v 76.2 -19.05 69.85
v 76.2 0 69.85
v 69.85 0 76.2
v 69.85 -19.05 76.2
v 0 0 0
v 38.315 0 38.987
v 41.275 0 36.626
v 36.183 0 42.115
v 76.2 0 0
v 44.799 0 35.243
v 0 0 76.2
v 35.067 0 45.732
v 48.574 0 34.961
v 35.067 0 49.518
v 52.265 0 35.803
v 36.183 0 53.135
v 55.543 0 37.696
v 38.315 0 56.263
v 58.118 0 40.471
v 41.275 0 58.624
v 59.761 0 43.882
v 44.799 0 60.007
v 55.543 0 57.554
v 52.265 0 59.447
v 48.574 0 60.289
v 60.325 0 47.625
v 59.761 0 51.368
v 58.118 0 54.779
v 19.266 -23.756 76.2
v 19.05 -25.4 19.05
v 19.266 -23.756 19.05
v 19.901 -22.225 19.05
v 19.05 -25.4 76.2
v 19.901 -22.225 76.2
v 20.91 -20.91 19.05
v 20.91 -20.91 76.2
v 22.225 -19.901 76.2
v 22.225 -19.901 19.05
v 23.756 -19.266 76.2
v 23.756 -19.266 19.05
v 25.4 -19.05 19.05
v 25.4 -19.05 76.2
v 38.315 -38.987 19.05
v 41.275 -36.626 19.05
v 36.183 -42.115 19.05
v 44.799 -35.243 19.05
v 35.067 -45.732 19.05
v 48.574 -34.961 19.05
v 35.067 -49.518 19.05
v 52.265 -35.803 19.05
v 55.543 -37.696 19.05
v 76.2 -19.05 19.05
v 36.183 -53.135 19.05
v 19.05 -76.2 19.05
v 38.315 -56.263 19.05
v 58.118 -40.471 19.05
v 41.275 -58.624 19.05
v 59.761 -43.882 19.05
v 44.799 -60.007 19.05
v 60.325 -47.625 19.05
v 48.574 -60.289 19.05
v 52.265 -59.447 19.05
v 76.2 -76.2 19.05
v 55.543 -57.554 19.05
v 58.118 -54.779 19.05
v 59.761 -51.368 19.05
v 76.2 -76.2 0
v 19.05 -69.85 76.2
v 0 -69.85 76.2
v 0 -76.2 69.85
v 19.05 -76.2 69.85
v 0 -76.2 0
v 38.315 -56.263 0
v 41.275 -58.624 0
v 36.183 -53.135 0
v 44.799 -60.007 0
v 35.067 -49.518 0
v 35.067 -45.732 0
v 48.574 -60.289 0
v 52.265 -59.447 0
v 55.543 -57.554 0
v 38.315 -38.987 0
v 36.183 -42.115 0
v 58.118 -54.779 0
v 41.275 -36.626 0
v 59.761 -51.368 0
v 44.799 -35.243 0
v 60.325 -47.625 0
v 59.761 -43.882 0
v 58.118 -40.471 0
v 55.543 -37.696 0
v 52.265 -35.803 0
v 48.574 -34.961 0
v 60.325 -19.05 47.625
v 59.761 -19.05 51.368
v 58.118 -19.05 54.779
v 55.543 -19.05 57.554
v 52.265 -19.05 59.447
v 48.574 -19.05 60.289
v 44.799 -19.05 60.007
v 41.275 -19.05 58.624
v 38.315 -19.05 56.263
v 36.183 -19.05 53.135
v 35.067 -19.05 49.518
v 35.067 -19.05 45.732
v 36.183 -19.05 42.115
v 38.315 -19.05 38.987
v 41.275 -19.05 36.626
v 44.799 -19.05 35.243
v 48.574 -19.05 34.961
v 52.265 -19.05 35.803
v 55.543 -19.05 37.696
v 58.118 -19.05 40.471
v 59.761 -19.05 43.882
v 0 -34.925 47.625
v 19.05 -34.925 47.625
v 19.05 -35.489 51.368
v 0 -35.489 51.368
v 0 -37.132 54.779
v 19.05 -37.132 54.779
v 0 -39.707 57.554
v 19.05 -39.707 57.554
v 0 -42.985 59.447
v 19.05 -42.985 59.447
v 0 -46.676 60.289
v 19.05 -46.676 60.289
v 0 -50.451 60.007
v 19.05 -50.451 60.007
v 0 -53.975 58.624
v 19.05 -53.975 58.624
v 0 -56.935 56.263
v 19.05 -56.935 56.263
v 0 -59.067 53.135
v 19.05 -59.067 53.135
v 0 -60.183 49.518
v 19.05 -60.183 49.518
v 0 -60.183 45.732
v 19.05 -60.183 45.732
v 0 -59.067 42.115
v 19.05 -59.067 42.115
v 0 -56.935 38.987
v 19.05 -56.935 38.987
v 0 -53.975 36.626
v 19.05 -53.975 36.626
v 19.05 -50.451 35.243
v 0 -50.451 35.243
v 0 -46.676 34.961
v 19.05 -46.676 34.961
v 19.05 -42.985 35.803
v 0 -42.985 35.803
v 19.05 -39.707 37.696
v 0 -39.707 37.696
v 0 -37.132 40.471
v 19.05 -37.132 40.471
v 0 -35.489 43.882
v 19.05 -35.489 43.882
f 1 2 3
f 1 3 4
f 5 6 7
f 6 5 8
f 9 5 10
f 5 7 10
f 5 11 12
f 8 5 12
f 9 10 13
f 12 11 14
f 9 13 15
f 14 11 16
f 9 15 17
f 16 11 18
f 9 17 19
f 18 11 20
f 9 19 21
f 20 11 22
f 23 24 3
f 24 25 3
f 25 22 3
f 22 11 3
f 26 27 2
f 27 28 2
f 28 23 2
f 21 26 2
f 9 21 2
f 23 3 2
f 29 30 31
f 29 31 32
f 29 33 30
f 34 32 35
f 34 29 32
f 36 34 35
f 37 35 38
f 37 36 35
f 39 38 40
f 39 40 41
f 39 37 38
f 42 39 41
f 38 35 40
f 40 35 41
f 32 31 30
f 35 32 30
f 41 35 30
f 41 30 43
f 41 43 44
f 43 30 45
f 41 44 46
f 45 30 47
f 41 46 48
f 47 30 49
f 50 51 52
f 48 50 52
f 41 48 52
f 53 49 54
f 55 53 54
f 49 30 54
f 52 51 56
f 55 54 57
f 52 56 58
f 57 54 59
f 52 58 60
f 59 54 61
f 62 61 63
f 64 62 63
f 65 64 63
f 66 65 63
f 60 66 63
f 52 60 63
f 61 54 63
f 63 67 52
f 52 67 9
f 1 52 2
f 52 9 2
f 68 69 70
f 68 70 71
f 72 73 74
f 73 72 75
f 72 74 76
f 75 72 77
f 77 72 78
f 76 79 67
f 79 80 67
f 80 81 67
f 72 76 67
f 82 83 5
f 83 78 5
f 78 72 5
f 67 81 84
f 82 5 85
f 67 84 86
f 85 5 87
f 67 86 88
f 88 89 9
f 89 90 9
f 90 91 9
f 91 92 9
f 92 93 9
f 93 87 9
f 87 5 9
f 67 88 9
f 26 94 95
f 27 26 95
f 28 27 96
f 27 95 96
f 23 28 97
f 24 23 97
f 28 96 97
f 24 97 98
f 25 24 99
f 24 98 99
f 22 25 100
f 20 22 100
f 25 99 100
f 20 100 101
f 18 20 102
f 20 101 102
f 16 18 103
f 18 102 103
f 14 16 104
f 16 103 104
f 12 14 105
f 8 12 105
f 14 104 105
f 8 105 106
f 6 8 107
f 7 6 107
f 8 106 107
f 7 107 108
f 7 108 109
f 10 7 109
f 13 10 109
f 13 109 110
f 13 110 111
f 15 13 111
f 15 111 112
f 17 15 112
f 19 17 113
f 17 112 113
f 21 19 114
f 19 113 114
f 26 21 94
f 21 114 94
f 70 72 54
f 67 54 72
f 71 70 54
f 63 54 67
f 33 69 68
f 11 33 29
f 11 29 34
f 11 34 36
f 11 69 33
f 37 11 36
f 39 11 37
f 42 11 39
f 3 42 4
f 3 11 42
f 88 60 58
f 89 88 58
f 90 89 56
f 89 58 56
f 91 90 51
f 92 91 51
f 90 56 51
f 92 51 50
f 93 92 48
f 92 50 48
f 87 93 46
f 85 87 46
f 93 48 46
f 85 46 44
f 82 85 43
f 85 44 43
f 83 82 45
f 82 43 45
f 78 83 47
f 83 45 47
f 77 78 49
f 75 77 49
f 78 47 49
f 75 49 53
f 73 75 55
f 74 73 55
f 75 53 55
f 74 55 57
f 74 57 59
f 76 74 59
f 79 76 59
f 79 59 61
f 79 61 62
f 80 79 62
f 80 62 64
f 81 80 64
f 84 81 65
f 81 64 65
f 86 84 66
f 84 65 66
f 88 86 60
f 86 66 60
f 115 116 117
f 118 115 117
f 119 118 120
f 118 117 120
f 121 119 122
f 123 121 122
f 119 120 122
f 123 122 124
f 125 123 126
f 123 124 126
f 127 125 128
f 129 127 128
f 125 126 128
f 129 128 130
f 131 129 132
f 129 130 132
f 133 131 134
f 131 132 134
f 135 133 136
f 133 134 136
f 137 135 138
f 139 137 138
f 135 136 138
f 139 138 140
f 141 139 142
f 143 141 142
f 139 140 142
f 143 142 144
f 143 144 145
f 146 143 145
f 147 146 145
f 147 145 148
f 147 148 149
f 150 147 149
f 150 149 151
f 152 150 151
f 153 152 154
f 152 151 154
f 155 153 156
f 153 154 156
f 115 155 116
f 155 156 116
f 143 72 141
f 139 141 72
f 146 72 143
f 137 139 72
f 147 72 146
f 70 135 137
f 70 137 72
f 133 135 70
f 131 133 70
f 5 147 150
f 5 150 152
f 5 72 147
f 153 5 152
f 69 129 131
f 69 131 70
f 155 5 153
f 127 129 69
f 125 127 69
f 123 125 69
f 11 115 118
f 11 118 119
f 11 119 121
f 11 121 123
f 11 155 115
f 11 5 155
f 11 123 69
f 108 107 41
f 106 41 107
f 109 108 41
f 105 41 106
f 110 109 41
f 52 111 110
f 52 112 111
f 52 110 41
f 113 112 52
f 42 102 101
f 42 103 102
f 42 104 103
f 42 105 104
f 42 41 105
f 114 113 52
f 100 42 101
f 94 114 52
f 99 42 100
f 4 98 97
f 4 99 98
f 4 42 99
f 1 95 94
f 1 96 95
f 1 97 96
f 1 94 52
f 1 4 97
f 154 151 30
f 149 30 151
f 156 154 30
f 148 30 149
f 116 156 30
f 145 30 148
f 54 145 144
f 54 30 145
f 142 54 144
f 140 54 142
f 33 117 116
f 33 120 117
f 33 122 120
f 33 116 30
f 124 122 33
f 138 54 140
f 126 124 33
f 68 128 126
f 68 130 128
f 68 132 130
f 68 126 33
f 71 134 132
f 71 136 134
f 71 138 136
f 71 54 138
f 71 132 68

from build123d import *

# Parameters (mm, degrees)
F0_W     = 76.2
F0_H     = 76.2
F1_DEPTH = 76.2
F2_W     = 57.15
F2_H     = 57.15
F3_DEPTH = 57.15
F4_R     = 12.7
F5_DEPTH = 19.05
F6_R     = 12.7
F7_DEPTH = 19.05
F8_R     = 12.7
F9_DEPTH = 19.05
F10_SIZE = 6.35
F11_R    = 6.35


with BuildPart() as f1:
    # F0 (on Front) → F1 (new body)
    with BuildSketch(Plane.XZ):
        with Locations((38.1, 38.1)):
            Rectangle(F0_W, F0_H)
    extrude(amount=F1_DEPTH)

    # F2 (on face) → F3 (cut)
    with BuildSketch(Plane.XZ.offset(76.2)):
        with Locations((47.625, 47.625)):
            Rectangle(F2_W, F2_H)
    extrude(amount=-F3_DEPTH, mode=Mode.SUBTRACT)

    # F4 (on face) → F5 (cut)
    with BuildSketch(Plane.XY.offset(19.05)):
        with Locations((47.625, -47.625)):
            Circle(F4_R)
    extrude(amount=-F5_DEPTH, mode=Mode.SUBTRACT)

    # F6 (on face) → F7 (cut)
    with BuildSketch(Plane.YZ.offset(19.05)):
        with Locations((-47.625, 47.625)):
            Circle(F6_R)
    extrude(amount=-F7_DEPTH, mode=Mode.SUBTRACT)

    # F8 (on face) → F9 (cut)
    with BuildSketch(Plane.XZ.offset(19.05)):
        with Locations((47.625, 47.625)):
            Circle(F8_R)
    extrude(amount=-F9_DEPTH, mode=Mode.SUBTRACT)

    # F10
    f10_edges = [f1.edges().sort_by_distance(p)[0] for p in [
        (9.525, -76.2, 76.2),
        (76.2, -9.525, 76.2),
    ]]
    chamfer(f10_edges, length=F10_SIZE)

    # F11
    f11_edges = [f1.edges().sort_by_distance(p)[0] for p in [
        (19.05, -19.05, 47.625),
    ]]
    fillet(f11_edges, radius=F11_R)


solid = f1.part
